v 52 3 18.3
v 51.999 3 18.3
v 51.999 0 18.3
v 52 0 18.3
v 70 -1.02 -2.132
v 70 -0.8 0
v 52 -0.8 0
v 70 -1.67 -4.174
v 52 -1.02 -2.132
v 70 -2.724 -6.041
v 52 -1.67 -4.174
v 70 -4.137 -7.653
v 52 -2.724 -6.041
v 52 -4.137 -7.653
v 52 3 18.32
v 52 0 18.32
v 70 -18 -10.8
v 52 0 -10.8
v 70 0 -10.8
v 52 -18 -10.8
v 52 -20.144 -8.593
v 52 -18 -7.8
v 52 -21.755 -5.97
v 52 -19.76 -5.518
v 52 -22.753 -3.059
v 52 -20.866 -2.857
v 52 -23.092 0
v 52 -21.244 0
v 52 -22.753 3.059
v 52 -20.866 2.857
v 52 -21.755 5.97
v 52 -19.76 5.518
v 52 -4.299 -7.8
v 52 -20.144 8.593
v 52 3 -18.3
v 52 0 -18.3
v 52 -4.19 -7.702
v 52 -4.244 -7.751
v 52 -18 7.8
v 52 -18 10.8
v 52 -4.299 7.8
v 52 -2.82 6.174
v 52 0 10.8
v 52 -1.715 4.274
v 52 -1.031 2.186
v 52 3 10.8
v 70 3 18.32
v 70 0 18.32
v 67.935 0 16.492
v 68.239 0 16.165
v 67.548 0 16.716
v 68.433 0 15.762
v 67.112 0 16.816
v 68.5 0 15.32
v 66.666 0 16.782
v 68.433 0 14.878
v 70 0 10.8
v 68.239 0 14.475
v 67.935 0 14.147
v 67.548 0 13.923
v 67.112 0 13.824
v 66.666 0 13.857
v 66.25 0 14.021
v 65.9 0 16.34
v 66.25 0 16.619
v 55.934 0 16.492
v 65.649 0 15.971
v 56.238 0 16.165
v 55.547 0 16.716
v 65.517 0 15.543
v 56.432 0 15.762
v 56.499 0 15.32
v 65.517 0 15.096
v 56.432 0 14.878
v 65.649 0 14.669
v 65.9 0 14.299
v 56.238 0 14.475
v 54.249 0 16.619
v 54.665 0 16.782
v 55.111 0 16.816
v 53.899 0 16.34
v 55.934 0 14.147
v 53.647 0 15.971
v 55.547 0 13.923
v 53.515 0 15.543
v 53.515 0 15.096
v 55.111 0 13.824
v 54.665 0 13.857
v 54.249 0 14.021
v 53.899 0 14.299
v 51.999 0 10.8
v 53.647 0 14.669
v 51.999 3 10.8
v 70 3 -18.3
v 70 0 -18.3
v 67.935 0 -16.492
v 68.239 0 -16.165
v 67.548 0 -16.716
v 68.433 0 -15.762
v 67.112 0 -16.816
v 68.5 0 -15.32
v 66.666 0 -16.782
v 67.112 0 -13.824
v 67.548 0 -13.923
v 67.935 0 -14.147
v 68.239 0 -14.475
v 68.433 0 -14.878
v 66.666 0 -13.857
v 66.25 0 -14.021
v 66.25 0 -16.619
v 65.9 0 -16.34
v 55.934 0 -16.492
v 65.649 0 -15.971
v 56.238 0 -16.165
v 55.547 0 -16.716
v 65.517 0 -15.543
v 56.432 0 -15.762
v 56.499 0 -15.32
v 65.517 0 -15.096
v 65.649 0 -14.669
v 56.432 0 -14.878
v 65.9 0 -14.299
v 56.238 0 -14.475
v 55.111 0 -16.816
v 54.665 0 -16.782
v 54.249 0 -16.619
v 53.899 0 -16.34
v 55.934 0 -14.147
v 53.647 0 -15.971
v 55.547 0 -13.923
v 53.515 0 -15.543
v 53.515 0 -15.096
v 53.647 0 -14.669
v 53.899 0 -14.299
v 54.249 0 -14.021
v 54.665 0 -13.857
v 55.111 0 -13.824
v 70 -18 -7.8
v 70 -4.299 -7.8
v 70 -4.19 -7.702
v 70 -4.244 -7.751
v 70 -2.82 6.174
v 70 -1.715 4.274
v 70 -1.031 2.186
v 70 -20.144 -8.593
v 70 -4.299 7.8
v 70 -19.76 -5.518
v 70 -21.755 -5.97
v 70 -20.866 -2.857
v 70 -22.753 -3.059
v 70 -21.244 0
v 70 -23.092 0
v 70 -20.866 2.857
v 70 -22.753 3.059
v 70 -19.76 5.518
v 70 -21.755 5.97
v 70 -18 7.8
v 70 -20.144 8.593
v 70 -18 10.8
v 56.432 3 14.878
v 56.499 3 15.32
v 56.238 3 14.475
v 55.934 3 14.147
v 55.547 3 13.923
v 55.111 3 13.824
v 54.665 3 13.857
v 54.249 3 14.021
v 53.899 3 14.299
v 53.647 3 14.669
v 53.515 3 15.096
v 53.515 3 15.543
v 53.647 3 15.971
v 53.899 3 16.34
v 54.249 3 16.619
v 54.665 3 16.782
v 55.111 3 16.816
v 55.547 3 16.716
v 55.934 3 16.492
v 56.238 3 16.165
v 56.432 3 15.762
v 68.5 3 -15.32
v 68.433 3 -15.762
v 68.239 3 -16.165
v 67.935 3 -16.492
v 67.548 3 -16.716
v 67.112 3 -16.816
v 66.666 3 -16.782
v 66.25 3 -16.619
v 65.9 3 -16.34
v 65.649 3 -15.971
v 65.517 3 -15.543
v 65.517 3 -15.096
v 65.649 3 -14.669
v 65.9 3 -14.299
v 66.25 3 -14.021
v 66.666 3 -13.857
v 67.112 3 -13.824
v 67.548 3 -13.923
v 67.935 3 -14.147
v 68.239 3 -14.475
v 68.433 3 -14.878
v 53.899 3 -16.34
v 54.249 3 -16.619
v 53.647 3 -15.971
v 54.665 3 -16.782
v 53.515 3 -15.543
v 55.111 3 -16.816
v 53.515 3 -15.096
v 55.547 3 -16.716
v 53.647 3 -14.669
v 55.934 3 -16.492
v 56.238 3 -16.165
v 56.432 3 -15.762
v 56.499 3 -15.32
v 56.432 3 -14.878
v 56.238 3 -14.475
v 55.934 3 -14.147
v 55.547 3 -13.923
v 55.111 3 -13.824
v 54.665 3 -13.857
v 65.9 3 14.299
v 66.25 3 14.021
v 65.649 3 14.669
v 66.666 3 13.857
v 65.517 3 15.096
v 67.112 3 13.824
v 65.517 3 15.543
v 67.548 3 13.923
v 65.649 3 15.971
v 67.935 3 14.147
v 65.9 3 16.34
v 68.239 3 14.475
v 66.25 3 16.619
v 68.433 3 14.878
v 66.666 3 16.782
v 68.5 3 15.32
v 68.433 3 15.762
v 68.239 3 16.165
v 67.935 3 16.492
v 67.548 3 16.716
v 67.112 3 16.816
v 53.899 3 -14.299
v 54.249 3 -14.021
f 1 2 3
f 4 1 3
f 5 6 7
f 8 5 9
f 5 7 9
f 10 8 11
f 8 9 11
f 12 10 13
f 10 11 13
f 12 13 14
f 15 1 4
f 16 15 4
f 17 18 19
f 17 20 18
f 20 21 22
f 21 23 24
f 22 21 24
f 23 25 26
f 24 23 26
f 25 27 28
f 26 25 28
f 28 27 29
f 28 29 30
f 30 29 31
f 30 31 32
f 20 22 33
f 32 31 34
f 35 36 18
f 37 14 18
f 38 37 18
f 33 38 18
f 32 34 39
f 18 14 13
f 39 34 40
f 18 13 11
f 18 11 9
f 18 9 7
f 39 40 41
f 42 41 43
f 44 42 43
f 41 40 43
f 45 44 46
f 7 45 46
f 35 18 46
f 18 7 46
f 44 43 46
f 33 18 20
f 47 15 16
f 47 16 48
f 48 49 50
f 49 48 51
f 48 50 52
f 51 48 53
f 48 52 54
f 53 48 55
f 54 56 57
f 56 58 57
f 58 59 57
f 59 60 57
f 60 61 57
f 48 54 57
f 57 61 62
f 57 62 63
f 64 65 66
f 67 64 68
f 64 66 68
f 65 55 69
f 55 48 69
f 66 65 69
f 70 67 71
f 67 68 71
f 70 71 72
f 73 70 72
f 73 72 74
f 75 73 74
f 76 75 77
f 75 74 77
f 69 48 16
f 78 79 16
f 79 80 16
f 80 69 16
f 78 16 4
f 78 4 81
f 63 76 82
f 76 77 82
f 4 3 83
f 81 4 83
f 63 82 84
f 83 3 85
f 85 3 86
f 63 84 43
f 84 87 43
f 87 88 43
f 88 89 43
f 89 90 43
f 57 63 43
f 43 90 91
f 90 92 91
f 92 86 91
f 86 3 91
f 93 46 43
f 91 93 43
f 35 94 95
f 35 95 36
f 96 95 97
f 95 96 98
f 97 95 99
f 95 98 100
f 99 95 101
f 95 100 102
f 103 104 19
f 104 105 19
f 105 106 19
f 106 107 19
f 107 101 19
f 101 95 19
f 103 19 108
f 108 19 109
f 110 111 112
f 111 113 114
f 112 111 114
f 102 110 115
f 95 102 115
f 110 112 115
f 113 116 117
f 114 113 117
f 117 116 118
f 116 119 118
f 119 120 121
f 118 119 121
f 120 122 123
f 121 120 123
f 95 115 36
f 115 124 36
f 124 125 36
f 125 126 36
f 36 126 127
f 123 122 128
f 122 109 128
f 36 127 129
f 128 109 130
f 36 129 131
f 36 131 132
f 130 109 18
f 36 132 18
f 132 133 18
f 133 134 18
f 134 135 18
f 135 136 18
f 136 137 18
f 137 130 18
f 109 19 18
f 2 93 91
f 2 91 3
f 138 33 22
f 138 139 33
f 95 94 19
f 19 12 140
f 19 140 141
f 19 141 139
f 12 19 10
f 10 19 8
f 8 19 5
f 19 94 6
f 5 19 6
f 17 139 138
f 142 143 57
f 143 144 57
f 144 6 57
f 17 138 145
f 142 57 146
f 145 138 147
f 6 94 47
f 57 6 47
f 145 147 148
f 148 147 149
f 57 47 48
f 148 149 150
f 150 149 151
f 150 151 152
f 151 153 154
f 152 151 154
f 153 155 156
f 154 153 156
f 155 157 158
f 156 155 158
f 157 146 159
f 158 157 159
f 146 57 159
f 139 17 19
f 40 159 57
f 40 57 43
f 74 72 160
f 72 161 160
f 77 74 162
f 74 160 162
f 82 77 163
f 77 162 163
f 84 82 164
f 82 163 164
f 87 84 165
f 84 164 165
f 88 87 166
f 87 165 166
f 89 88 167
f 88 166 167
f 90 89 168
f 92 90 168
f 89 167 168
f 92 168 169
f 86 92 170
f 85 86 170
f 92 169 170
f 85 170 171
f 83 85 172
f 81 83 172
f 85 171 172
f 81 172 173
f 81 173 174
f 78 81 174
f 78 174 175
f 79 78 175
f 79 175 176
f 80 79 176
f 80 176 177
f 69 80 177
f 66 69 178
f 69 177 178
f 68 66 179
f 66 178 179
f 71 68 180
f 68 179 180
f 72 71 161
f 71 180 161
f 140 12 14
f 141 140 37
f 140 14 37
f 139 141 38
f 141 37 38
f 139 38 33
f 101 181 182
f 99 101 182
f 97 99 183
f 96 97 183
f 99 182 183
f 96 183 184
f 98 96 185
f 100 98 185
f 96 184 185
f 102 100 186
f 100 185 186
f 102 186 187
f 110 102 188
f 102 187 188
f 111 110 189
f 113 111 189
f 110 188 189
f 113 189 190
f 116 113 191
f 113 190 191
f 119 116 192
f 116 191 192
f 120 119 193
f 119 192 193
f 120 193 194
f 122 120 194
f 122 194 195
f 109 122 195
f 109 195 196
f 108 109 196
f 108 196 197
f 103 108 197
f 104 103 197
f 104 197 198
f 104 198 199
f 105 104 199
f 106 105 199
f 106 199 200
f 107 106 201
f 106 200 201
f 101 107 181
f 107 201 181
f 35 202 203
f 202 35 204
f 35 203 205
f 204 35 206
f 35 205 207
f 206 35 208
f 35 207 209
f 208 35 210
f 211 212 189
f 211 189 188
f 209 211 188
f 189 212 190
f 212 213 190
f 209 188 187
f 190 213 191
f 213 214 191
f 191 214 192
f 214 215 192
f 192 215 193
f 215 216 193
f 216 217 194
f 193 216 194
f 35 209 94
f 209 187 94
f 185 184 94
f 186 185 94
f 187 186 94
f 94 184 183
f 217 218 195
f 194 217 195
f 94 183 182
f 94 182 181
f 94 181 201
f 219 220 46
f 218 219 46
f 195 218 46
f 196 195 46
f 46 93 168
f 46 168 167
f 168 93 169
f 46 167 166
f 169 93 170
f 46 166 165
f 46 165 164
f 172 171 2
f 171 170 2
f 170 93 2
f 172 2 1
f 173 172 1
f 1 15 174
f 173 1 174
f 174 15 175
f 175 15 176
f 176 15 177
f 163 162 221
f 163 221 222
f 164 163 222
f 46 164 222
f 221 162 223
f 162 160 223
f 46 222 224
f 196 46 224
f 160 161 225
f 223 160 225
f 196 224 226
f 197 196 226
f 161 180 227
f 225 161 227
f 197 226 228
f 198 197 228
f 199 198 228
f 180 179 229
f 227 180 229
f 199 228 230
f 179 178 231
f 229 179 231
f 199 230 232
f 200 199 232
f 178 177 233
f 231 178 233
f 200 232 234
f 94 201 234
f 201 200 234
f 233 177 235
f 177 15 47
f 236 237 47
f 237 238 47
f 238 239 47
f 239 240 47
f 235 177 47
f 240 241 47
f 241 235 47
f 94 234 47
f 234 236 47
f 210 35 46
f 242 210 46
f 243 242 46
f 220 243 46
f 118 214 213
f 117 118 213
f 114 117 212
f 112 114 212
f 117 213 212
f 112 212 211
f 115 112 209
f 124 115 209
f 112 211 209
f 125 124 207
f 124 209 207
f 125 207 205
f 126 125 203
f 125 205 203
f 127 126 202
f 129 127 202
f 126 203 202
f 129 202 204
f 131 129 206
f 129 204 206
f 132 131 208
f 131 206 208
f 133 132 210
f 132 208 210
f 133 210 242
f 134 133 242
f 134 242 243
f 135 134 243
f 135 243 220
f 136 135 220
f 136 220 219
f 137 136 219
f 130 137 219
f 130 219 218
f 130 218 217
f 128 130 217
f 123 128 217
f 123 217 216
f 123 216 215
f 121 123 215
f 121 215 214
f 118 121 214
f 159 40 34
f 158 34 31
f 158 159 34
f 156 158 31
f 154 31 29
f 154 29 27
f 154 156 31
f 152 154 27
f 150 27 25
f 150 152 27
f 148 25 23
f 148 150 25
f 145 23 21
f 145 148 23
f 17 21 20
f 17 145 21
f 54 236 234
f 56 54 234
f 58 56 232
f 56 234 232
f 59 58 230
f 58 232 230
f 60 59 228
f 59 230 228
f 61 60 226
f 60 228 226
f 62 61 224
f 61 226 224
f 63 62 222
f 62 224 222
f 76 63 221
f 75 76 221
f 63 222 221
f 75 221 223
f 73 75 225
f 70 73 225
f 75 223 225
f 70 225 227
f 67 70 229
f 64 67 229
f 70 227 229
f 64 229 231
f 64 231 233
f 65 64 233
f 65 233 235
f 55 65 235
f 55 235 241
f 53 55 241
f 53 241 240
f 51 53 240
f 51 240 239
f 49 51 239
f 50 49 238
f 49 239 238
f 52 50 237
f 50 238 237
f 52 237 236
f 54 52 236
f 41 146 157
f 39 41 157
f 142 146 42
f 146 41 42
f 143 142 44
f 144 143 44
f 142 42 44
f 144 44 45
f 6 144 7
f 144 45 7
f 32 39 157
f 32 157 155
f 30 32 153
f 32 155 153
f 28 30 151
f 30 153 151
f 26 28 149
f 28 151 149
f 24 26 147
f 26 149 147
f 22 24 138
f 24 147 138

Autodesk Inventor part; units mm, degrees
ref_plane "YZ Plane" through (0, 0, 0) normal (1, 0, 0) x (0, 1, 0)
ref_plane "XZ Plane" through (0, 0, 0) normal (0, 1, 0) x (-1, 0, 0)
sketch "Sketch1" plane through (0, 0, 0) normal (0, 1, 0) x (-1, 0, 0)
  line L0 (70, 0) -> (70, -70)
  line L1 (70, -70) -> (0, -70)
  line L2 (-70, 0) -> (-70, 70)
  line L3 (-70, 70) -> (0, 70)
  line L4 (0, 70) -> (70, 70)
  line L5 (70, 70) -> (70, 0)
  line L6 (0, -70) -> (-70, -70)
  line L7 (-70, -70) -> (-70, 0)
  point P0 (0, 0)
extrude "Extrusion1" add sketch "Sketch1" along normal blind 3
fillet "Fillet1" radius 5 3 edges at (70, 1.5, 70) (70, 1.5, -70) (-70, 1.5, 70)
fillet "Fillet2" radius 5 1 edges at (-70, 1.5, -70)
ref_plane "Work Plane1" through (65, 0, 65) normal (1, 0, 0) x (0, 0, -1)
sketch "Sketch6" plane through (70, 0, 65) normal (1, 0, 0) x (0, 0, -1)
  line L0 (65, 0) -> (57.2, 0)
  line L1 (130, 0) -> (0, 0) projected
  line L2 (65, 0) -> (72.8, 0)
  line L3 (57.2, 0) -> (57.2, -18)
  line L4 (72.8, 0) -> (72.8, -18)
  line L5 (65, 0) -> (65, -10)
  arc A0 (57.2, -18) -> (72.8, -18) centre (65, -10.2437) ccw
  line L6 (57.2, 0) -> (54.2, 0)
  line L7 (54.2, 0) -> (54.2, -18)
  line L8 (72.8, 0) -> (75.8, 0)
  line L9 (75.8, 0) -> (75.8, -18)
  arc A1 (54.2, -18) -> (75.8, -18) centre (65, -9.0916) ccw
  dimension "d17" = 18
  dimension "d21" = 3
  dimension "d22" = 3
extrude "Extrusion3" add sketch "Sketch6" against normal blind 18 contours L3 A0 L4 L1 L9 A1 L7
pattern_circular "Circular Pattern1" count 4 over 360 about axis through (0, -10, 0) along (0, 1, 0) of "Extrusion3"
sketch "Sketch8" plane through (0, 3, 0) normal (0, 1, 0) x (1, 0, 0)
  circle A0 centre (58.4636, -19.348) radius 2.5
  point P0 (0, 0)
  dimension "d35" = 5
extrude "Extrusion5" cut sketch "Sketch8" against normal blind 3
sketch "Sketch9" plane through (0, 3, 0) normal (0, 1, 0) x (1, 0, 0)
  circle A0 centre (-60.6489, 18.9578) radius 2.5
  point P0 (0, 0)
  dimension "d39" = 5
extrude "Extrusion6" cut sketch "Sketch9" against normal blind 3
sketch "Sketch10" plane through (0, 3, 0) normal (0, 1, 0) x (1, 0, 0)
  line L0 (70, -65) -> (70, 65) projected
  line L1 (70, 15.1257) -> (39.2687, 15.1257)
  line L2 (39.2687, 15.1257) -> (39.2687, -15.3197)
  line L3 (39.2687, -15.3197) -> (70, -15.3197)
  line L4 (70, -15.3197) -> (70, 15.1257)
  point P0 (0, 0)
extrude "Extrusion7" add sketch "Sketch10" along normal blind 10
sketch "Sketch11" plane through (0, 3, 0) normal (0, 1, 0) x (1, 0, 0)
  point P0 (0, 0)
sketch "Sketch12" plane through (0, 3, 0) normal (0, 1, 0) x (1, 0, 0)
  line L0 (39.2687, -15.3197) -> (39.2687, -70)
  line L1 (10.8, -70) -> (65, -70) projected
  line L2 (39.2687, -15.3197) -> (39.2687, 15.1257) projected
  line L3 (39.2687, -70) -> (-73.9803, -70)
  line L4 (-73.9803, -70) -> (-73.9803, 75.2408)
  line L5 (-73.9803, 75.2408) -> (39.2687, 75.2408)
  line L6 (39.2687, 75.2408) -> (39.2687, -70)
  point P0 (0, 0)
extrude "Extrusion8" cut sketch "Sketch12" against normal blind 100
sketch "Sketch13" plane through (0, 3, 0) normal (0, 1, 0) x (1, 0, 0)
  line L0 (39.2687, -15.3197) -> (74.5621, -15.3197)
  line L1 (74.5621, -15.3197) -> (74.5621, -76.2104)
  line L2 (74.5621, -76.2104) -> (39.2687, -76.2104)
  line L3 (39.2687, -76.2104) -> (39.2687, -15.3197)
  point P0 (0, 0)
extrude "Extrusion9" cut sketch "Sketch13" against normal blind 100
sketch "Sketch14" plane through (0, 3, 0) normal (0, 1, 0) x (1, 0, 0)
  line L0 (39.2687, 15.1257) -> (72.3919, 15.1257)
  line L1 (72.3919, 15.1257) -> (72.3919, 74.5163)
  line L2 (72.3919, 74.5163) -> (39.2687, 74.5163)
  line L3 (39.2687, 74.5163) -> (39.2687, 15.1257)
  point P0 (0, 0)
extrude "Extrusion10" cut sketch "Sketch14" against normal blind 100
sketch "Sketch17" plane through (70, -18, 10.8) normal (1, 0, 0) x (0, 0, -1)
  line L0 (-4.5197, 18) -> (-4.5197, 21)
  line L1 (-4.5197, 18) -> (-4.5197, 31) projected
  line L2 (-4.5197, 21) -> (25.9257, 21)
  line L3 (25.9257, 31) -> (25.9257, 18) projected
  line L4 (25.9257, 21) -> (-4.5197, 21)
  line L5 (-4.5197, 21) -> (-4.5197, 31)
  line L6 (-4.5197, 31) -> (25.9257, 31)
  line L7 (25.9257, 31) -> (25.9257, 21)
  point P0 (10.8, 18)
  dimension "d50" = 3
extrude "Extrusion11" cut sketch "Sketch17" against normal blind 100
sketch "Sketch18" plane through (39.2687, 0, -15.1257) normal (-1, 0, 0) x (0, 0, 1)
  line L0 (0, 3) -> (30.4454, 3)
  line L1 (30.4454, 3) -> (30.4454, 0)
  line L2 (30.4454, 0) -> (0, 0)
  line L3 (0, 0) -> (0, 3)
  point P0 (15.1257, 0)
extrude "Extrusion12" cut sketch "Sketch18" against normal blind 13
sketch "Sketch20" plane through (52, 0, 65) normal (-1, 0, 0) x (0, 0, 1)
  line L0 (-72.8, -18) -> (-72.8, 0) projected
  line L1 (-72.8, -9) -> (-57.2, -9)
  line L2 (-57.2, -18) -> (-57.2, 0) projected
  line L3 (-72.8, -18) -> (-72.8, -4)
  arc A0 (-72.8, -18) -> (-57.2, -18) centre (-65, -10.2437) ccw projected
  line L4 (-65, -21.2437) -> (-72.8, -21.2437)
  line L5 (-72.8, -4) -> (-72.8, -0.8)
  line L6 (-65, -21.2437) -> (-65, -3.2437)
  line L7 (-65, -21.2437) -> (-65, -11.2437)
  line L8 (-65, -11.2437) -> (-65, -1.2437)
  line L9 (-65, -1.2437) -> (-65, -0.8)
  arc A1 (-65, -0.8) -> (-72.6527, -4.1368) centre (-65, -11.2437) ccw
  arc A2 (-57.2, -4.2988) -> (-65, -0.8) centre (-65, -11.2437) ccw
  arc A3 (-72.6527, -4.1368) -> (-72.8, -4.2988) centre (-65, -11.2437) ccw
  arc A4 (-57.2, -4.2988) -> (-57.2, -4.2988) centre (-65, -11.2437) ccw
  line L10 (-72.8, -4.2988) -> (-72.8, 0)
  line L11 (-57.2, 0) -> (-57.2, -4.2988)
  line L12 (-57.2, 0) -> (-72.8, 0) projected
  line L13 (-57.2, -4.2988) -> (-57.2, 0)
  line L14 (-72.8, -4.2988) -> (-72.8, 0)
  line L15 (-72.8, 0) -> (-57.2, 0)
  point P0 (-65, 0)
  dimension "d55" = 14
  dimension "d56" = 3.2
  dimension "d57" = 18
  dimension "d58" = 10
  dimension "d59" = 10
extrude "Extrusion13" add sketch "Sketch20" against normal blind 18 contours L0 L12 L2 A2 A1 A3
sketch "Sketch22" plane through (52.2687, 0, 10.8) normal (0, 1, 0) x (1, 0, 0)
  line L0 (-0.2687, 21.6) -> (0, 21.6)
  line L1 (0, 21.6) -> (0, 0)
  line L2 (0, 0) -> (-0.2687, 0)
  line L3 (-0.2687, 0) -> (-0.2687, 21.6)
  point P0 (-52.2687, 10.8)
extrude "Extrusion14" add sketch "Sketch22" along normal blind 3
sketch "Sketch24" plane through (52.2687, 0, -15.1257) normal (-1, 0, 0) x (0, 0, 1)
  line L0 (30.4454, 3) -> (25.9257, 3)
  line L1 (25.9257, 3) -> (25.9257, 0)
  line L2 (25.9257, 0) -> (30.4454, 0)
  line L3 (30.4454, 0) -> (30.4454, 3)
  point P0 (15.1257, 0)
extrude "Extrusion16" add sketch "Sketch24" along normal blind 0.3
sketch "Sketch25" plane through (52.2687, 0, -15.1257) normal (-1, 0, 0) x (0, 0, 1)
  line L0 (0, 0) -> (4.3257, 0)
  line L1 (4.3257, 0) -> (4.3257, 3)
  line L2 (4.3257, 3) -> (0, 3)
  line L3 (0, 3) -> (0, 0)
  point P0 (15.1257, 0)
extrude "Extrusion17" add sketch "Sketch25" along normal blind 0.27
sketch "Sketch26" plane through (51.9687, 0, -15.1257) normal (-1, 0, 0) x (0, 0, 1)
  line L0 (30.4454, 3) -> (25.9257, 3)
  line L1 (25.9257, 3) -> (25.9257, 0)
  line L2 (25.9257, 0) -> (30.4454, 0)
  line L3 (30.4454, 0) -> (30.4454, 3)
  point P0 (15.1257, 0)
extrude "Extrusion18" cut sketch "Sketch26" against normal blind 0.03
sketch "Sketch27" plane through (70, 0, 15.3197) normal (0, 0, 1) x (1, 0, 0)
  line L0 (0, 3) -> (-18, 3)
  line L1 (-18, 3) -> (-18, 0)
  line L2 (-18, 0) -> (0, 0)
  line L3 (0, 0) -> (0, 3)
  point P0 (-70, 0)
extrude "Extrusion19" add sketch "Sketch27" along normal blind 3
sketch "Sketch32" plane through (51.9987, 0, -15.1257) normal (-1, 0, 0) x (0, 0, 1)
  line L0 (4.3257, 0) -> (-3, 0)
  line L1 (-3, 0) -> (-3, 3)
  line L2 (-3, 3) -> (4.3257, 3)
  line L3 (4.3257, 3) -> (4.3257, 0)
  point P0 (15.1257, 0)
extrude "Extrusion21" cut sketch "Sketch32" against normal blind 30
sketch "Sketch33" plane through (51.9987, 0, -15.1257) normal (-1, 0, 0) x (0, 0, 1)
  line L0 (33.4454, 0) -> (25.9257, 0) projected
  line L1 (25.9257, 3) -> (33.4257, 3)
  line L2 (33.4257, 3) -> (33.4257, 0)
  line L3 (33.4257, 0) -> (25.9257, 0)
  line L4 (25.9257, 0) -> (25.9257, 3)
  point P0 (15.1257, 0)
  dimension "d86" = 7.5
extrude "Extrusion22" add sketch "Sketch33" against normal blind 18
sketch "Sketch34" plane through (52, 3, -10.8) normal (0, 1, 0) x (1, 0, 0)
  line L0 (18, -29.1197) -> (18, -26.1197)
  line L1 (18, -29.1197) -> (18, -21.6) projected
  line L2 (18, -26.1197) -> (-0.0013, -26.1197)
  line L3 (-0.0013, -29.1) -> (-0.0013, -21.6) projected
  line L4 (-0.0013, -26.1197) -> (2.9987, -26.1197)
  line L5 (18, -26.1197) -> (15, -26.1197)
  circle A0 centre (15, -26.1197) radius 1.5
  circle A1 centre (2.9987, -26.1197) radius 1.5
  point P0 (-52, -10.8)
  dimension "d89" = 3
  dimension "d90" = 3
  dimension "d91" = 3
  dimension "d92" = 3
  dimension "d93" = 3
extrude "Extrusion23" cut sketch "Sketch34" against normal blind 18
sketch "Sketch35" plane through (70, -18, -10.8) normal (0, 0, -1) x (-1, 0, 0)
  line L0 (18, 21) -> (0, 21)
  line L1 (0, 21) -> (0, 18)
  line L2 (0, 18) -> (18, 18)
  line L3 (18, 18) -> (18, 21)
  point P0 (70, 18)
extrude "Extrusion24" add sketch "Sketch35" along normal blind 7.5
mirror "Mirror1" about plane through (0, 0, 0) normal (0, 0, 1) of "Extrusion23"
properties part number "smallpart"
